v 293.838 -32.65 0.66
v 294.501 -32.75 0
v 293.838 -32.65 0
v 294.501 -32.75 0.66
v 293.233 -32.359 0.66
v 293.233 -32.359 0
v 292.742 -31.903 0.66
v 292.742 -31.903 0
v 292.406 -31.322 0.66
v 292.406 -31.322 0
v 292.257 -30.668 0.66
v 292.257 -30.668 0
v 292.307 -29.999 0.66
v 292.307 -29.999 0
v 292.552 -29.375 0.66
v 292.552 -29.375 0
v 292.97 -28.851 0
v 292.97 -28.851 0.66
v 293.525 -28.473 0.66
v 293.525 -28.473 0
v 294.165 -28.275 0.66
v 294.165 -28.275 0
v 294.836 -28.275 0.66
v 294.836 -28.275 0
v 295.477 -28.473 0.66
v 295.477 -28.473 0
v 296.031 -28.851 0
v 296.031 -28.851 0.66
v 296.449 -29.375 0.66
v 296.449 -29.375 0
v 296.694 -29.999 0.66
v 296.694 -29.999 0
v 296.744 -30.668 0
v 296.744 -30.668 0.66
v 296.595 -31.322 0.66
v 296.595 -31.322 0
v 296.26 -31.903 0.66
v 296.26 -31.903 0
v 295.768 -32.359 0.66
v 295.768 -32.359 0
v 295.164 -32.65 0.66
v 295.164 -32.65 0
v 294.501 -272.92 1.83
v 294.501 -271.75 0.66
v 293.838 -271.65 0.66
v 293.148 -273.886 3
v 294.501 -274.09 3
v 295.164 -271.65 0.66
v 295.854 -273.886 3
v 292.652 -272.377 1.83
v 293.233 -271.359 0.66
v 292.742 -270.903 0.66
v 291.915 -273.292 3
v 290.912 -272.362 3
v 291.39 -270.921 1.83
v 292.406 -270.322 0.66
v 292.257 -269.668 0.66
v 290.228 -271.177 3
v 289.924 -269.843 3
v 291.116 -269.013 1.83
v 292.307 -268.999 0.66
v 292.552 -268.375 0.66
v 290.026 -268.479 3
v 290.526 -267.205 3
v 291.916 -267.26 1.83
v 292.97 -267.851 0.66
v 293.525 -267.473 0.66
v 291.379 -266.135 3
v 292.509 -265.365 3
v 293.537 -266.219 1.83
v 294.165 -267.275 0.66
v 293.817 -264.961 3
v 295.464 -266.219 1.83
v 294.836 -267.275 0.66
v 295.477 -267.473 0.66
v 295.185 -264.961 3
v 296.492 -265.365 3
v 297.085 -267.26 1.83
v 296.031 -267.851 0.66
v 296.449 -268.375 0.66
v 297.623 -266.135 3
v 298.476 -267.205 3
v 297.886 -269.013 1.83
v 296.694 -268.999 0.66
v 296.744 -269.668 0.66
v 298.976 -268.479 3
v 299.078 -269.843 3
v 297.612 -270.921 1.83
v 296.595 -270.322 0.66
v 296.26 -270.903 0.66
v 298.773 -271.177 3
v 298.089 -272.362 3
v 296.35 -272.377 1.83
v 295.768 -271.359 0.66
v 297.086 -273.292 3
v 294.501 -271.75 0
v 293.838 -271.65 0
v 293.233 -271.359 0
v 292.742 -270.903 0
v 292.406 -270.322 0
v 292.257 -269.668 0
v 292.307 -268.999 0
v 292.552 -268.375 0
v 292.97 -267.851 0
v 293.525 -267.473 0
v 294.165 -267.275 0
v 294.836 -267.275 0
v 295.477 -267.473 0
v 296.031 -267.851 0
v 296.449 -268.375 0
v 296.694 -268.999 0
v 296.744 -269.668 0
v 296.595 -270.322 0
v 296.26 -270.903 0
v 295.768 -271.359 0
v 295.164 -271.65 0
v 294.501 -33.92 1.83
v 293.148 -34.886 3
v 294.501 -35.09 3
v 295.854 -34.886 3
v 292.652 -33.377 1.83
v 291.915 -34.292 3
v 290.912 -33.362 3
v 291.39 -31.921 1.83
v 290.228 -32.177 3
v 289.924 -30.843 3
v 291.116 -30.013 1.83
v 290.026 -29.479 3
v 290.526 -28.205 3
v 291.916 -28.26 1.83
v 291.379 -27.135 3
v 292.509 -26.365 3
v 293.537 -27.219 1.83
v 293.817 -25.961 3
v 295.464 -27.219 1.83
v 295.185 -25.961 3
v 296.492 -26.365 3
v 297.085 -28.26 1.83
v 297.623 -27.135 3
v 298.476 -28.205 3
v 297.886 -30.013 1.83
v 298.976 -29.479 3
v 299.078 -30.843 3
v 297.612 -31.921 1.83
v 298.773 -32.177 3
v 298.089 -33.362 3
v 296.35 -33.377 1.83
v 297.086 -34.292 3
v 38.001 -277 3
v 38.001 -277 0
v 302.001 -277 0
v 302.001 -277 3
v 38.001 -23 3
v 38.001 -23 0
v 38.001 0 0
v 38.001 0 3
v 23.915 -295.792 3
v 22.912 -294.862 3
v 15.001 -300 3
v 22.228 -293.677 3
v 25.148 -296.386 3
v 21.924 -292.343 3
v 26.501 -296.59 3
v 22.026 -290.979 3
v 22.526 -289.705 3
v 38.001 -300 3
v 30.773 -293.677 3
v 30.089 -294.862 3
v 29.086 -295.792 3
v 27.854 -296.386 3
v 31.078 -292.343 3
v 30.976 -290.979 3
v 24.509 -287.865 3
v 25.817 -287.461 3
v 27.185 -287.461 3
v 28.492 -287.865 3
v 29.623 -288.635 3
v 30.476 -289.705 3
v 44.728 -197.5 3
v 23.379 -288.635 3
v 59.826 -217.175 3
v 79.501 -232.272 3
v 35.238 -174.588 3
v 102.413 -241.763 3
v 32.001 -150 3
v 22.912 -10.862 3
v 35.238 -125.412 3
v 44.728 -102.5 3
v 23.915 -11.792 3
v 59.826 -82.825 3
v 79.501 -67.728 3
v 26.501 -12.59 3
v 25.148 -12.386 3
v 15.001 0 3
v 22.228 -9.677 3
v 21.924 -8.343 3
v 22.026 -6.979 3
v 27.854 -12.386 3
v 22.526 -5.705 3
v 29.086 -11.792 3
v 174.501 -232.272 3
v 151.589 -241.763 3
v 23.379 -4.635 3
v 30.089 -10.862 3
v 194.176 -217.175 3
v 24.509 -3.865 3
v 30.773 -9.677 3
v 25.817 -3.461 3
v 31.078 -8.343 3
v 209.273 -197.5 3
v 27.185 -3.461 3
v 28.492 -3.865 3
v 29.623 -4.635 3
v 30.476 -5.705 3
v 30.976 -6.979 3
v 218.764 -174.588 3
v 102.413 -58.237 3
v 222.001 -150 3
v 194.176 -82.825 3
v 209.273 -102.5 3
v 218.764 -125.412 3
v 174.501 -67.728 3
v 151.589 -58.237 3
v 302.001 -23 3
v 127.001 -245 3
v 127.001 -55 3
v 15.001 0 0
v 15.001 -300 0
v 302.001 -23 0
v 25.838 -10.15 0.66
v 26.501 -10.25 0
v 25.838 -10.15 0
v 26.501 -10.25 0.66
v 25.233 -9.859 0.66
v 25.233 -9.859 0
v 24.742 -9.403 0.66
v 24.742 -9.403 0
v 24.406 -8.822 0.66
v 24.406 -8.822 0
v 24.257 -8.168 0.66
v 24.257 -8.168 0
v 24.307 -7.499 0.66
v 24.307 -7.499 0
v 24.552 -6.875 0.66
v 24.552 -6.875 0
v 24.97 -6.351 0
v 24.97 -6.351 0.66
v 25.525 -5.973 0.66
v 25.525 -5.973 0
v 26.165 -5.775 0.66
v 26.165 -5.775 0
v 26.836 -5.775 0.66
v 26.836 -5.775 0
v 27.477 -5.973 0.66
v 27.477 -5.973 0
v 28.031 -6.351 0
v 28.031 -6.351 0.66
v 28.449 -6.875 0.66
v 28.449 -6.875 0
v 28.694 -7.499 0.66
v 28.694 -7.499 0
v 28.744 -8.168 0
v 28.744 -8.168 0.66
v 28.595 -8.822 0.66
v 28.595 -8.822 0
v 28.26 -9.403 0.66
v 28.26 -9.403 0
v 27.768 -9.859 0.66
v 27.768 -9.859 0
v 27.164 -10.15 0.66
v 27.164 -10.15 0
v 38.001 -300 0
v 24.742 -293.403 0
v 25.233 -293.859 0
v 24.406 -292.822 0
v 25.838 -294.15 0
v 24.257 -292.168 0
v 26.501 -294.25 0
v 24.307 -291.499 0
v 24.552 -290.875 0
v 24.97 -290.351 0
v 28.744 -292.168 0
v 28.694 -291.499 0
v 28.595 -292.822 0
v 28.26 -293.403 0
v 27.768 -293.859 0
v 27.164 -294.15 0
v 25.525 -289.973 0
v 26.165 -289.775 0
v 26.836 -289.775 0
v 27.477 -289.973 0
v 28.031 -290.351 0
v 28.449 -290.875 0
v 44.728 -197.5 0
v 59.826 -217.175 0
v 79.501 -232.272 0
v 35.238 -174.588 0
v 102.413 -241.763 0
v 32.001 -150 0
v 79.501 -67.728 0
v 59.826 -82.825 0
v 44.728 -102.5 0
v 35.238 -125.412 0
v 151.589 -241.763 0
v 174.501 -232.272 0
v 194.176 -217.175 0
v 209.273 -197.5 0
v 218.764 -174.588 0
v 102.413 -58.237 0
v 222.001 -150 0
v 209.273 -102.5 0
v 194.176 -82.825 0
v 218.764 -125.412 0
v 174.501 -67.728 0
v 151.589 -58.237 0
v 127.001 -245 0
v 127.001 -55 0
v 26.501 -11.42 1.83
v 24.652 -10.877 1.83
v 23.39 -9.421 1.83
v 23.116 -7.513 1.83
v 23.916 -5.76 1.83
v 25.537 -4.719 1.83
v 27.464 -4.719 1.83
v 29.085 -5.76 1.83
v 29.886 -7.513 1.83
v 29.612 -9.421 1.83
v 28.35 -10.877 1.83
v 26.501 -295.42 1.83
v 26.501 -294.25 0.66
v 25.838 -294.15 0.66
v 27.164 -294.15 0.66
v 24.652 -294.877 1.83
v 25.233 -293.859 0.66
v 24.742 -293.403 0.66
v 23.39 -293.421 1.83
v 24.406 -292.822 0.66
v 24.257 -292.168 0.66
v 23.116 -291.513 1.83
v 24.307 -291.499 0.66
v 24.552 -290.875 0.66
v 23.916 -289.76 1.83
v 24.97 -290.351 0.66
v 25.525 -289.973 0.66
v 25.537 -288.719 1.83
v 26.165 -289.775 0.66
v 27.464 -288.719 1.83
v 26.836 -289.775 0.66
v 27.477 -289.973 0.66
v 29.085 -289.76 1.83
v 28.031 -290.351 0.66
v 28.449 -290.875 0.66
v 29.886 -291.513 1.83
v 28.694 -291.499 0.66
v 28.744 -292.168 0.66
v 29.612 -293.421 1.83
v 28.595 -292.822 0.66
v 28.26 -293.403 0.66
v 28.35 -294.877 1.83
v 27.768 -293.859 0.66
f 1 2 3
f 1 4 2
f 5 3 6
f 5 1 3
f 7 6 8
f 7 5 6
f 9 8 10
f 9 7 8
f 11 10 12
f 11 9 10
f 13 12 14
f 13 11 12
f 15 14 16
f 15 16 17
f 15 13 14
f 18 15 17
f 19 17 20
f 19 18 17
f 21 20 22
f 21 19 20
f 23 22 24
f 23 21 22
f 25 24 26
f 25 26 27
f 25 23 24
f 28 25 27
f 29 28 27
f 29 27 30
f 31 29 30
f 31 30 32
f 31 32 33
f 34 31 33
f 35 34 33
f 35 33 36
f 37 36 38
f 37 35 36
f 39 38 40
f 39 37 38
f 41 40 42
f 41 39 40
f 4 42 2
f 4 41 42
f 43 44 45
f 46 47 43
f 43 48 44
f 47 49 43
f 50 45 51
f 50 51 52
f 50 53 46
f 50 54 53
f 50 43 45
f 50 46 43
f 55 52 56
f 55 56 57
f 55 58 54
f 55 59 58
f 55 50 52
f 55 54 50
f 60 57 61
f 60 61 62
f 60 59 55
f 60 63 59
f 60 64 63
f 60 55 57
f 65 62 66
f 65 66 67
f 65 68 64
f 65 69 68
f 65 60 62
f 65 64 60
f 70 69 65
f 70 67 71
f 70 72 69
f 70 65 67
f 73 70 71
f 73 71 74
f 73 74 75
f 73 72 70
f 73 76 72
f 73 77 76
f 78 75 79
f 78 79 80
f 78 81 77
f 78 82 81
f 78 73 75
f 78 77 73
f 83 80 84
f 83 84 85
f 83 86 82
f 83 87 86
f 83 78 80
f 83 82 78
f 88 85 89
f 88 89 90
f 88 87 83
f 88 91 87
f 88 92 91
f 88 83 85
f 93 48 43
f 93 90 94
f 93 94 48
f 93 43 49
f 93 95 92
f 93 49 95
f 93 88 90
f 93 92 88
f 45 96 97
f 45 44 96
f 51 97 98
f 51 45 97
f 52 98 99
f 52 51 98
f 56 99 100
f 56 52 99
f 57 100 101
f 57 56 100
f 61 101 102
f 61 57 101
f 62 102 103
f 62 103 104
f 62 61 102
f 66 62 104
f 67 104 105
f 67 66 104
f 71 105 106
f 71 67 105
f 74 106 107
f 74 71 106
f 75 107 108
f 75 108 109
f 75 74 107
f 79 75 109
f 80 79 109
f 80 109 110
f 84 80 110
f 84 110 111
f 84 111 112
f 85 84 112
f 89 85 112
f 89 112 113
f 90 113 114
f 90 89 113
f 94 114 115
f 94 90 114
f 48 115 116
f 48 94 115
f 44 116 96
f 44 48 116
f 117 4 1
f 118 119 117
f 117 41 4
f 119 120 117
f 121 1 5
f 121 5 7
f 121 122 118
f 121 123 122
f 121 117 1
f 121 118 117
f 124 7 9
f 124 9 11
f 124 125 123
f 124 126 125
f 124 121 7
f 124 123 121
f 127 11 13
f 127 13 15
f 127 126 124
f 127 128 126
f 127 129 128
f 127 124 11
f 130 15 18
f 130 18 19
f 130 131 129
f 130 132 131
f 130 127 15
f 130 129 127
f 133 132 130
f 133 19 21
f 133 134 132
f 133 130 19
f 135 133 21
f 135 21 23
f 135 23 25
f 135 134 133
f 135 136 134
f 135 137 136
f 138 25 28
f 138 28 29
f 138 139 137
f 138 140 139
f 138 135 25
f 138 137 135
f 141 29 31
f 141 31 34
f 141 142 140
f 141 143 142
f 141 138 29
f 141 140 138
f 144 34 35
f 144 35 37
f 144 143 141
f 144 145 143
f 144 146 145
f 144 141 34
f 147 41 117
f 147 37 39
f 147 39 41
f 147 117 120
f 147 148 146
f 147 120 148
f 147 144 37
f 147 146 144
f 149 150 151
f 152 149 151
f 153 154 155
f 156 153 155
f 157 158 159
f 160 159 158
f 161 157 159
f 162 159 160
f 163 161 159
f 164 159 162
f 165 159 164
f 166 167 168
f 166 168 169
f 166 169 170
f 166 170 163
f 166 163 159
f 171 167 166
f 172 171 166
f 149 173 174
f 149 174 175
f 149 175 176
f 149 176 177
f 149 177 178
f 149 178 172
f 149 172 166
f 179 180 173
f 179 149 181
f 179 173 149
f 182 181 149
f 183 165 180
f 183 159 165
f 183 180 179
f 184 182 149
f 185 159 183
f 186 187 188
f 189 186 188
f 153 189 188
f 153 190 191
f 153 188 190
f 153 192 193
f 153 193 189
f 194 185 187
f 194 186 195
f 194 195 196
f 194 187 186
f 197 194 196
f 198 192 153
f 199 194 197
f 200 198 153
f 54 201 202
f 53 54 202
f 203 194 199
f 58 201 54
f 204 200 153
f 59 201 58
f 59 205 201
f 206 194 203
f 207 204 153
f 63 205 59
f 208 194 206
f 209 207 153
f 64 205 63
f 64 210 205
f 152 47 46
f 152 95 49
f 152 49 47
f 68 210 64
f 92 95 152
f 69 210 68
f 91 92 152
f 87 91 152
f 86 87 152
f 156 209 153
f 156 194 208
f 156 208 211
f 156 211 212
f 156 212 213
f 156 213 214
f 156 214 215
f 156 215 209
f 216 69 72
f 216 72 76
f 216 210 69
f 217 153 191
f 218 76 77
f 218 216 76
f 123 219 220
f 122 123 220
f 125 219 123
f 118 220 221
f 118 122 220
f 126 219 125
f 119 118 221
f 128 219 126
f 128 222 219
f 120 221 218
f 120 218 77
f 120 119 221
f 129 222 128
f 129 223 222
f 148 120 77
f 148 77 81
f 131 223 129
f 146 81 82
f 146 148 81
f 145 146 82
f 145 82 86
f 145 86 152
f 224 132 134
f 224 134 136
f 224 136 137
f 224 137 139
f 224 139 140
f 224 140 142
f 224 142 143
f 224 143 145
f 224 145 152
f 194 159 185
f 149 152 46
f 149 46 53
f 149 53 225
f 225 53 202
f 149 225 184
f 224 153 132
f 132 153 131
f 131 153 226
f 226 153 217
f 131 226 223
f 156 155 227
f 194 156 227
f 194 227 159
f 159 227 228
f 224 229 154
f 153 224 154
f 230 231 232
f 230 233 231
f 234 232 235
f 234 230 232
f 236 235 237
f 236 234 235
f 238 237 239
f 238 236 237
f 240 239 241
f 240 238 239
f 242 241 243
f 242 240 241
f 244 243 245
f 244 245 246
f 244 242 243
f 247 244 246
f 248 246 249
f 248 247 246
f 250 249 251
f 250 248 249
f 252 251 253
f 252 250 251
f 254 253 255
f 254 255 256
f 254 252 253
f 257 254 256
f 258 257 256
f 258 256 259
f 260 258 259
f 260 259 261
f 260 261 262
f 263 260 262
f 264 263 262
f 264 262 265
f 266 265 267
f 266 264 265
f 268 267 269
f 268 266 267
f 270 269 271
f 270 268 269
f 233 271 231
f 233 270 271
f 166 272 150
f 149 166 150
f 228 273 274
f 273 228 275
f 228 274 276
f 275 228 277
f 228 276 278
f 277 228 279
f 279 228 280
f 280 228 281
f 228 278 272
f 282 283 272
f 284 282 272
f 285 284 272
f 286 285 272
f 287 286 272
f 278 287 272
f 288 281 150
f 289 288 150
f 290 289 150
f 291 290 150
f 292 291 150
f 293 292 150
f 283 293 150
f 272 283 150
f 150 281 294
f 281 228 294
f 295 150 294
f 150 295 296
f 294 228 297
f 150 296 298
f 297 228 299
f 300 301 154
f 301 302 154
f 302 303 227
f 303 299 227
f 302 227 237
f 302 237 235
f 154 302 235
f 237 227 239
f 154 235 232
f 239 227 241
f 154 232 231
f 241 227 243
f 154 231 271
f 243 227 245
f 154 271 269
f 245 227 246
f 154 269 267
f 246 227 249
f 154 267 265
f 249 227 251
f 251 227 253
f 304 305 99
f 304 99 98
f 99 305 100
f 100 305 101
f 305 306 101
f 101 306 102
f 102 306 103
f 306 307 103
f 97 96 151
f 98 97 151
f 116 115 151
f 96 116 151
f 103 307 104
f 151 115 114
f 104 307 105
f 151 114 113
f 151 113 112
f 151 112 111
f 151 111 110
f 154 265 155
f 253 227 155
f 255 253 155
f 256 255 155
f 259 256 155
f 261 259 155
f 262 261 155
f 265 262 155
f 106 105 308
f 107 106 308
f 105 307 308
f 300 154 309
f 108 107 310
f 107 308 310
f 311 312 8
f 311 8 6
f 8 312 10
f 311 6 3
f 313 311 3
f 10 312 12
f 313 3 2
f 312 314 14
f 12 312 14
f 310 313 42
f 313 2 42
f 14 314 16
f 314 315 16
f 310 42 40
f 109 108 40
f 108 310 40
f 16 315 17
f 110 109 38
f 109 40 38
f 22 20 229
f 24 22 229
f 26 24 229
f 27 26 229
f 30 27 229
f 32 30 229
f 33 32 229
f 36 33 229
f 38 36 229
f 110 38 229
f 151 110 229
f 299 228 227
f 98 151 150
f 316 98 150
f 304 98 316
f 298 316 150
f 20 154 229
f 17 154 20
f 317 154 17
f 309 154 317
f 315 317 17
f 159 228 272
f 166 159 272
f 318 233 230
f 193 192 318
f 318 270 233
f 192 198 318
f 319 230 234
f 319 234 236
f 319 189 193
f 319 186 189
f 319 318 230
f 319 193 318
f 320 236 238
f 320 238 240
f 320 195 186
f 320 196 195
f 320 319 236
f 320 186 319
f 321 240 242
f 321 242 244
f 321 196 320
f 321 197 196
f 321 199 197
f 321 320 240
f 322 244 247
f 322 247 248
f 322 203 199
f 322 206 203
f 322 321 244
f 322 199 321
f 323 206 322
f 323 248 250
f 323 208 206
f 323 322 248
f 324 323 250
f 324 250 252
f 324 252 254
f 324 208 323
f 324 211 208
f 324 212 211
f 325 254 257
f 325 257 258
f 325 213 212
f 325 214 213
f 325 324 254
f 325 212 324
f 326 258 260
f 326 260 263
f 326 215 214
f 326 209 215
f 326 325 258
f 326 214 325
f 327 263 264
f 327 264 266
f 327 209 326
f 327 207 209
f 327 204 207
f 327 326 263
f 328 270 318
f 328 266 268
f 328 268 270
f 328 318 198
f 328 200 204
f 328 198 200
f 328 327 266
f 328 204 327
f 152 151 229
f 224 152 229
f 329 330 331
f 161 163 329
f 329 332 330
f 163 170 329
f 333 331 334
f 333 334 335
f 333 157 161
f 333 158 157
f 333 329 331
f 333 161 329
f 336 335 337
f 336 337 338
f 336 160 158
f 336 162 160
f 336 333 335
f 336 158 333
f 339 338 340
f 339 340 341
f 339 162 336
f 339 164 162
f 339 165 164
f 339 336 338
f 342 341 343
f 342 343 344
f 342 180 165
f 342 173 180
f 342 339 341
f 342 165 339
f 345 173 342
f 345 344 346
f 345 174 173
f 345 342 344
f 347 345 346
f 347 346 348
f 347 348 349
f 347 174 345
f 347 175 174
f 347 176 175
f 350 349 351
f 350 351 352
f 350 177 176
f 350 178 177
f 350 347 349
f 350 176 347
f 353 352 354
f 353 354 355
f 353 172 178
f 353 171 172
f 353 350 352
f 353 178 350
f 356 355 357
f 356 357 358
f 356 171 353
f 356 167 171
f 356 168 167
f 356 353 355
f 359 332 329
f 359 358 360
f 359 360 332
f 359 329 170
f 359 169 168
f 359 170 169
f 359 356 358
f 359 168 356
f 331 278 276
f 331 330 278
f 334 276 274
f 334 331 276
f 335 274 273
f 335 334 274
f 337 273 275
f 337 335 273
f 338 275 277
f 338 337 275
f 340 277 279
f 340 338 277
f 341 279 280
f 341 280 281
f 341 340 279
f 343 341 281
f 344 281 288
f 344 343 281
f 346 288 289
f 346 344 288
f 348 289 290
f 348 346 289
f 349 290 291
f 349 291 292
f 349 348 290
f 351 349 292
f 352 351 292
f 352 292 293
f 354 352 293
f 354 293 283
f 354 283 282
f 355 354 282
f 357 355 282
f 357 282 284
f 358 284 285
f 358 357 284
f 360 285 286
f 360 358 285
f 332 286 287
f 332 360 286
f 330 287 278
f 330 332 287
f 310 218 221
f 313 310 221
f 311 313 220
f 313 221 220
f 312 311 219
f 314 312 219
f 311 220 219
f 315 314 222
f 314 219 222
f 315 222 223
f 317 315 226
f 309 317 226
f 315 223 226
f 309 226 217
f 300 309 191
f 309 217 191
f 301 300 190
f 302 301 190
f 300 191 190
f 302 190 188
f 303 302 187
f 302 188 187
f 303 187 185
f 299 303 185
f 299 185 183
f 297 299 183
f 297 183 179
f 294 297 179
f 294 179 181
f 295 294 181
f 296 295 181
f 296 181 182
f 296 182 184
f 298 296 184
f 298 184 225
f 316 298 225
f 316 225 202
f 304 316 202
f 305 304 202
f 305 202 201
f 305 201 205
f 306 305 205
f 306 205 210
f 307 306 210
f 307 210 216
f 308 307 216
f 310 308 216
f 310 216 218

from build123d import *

# Parameters (mm, degrees)
AUFSATZ_LINEAR_AUSTRAGEN1_DEPTH             = 3
FORMSENKUNG_F_R_M4_SENKSCHRAUBE_MIT_2_COUNT = 2
FORMSENKUNG_F_R_M4_SENKSCHRAUBE_MIT_2_PITCH = 284
FORMSENKUNG_F_R_M4_SENKSCHRAUBE_MIT_3_COUNT = 2
FORMSENKUNG_F_R_M4_SENKSCHRAUBE_MIT_3_PITCH = 268.942837793
FORMSENKUNG_F_R_M4_SENKSCHRAUBE_MIT_4_COUNT = 2
FORMSENKUNG_F_R_M4_SENKSCHRAUBE_MIT_4_PITCH = 374.441250399
SKIZZE4_R                                   = 95
SCHNITT_LINEAR_AUSTRAGEN1_DEPTH             = 10


with BuildPart() as part:
    # Skizze1 → Aufsatz-Linear austragen1 (new body)
    with BuildSketch(Plane.XY):
        Polygon((15.000749991, 0), (15.000749991, -300), (38.000749991, -300), (38.000749991, -277), (302.000749991, -277), (302.000749991, -23), (38.000749991, -23), (38.000749991, 0), align=None)
    extrude(amount=AUFSATZ_LINEAR_AUSTRAGEN1_DEPTH)

    # Skizze3 → Formsenkung für M4 Senkschraube mit Innensechskant1 (revolve, cut)
    with BuildSketch(Plane(origin=(26.500749991, -8, 3), x_dir=(0, -1, 0), z_dir=(1, 0, 0))):
        Polygon((0, 0), (0, 3), (2.25, 3), (2.25, 2.34), (4.59, 0), align=None)
    formsenkung_f_r_m4_senkschraube_mit_inne = revolve(axis=Axis((26.500749991, -8, 9.35), (0, 0, -1)), mode=Mode.SUBTRACT)

    # Formsenkung f_r M4 Senkschraube mit  2: Formsenkung für M4 Senkschraube mit Innensechskant1 ×2
    with Locations(*[(0, -i * FORMSENKUNG_F_R_M4_SENKSCHRAUBE_MIT_2_PITCH, 0) for i in range(1, FORMSENKUNG_F_R_M4_SENKSCHRAUBE_MIT_2_COUNT)]):
        add(formsenkung_f_r_m4_senkschraube_mit_inne, mode=Mode.SUBTRACT)

    # Formsenkung f_r M4 Senkschraube mit  3: Formsenkung für M4 Senkschraube mit Innensechskant1 ×2
    with Locations(*[Vector(0.9964942818315755, -0.08366090052690477, 0) * (i * FORMSENKUNG_F_R_M4_SENKSCHRAUBE_MIT_3_PITCH) for i in range(1, FORMSENKUNG_F_R_M4_SENKSCHRAUBE_MIT_3_COUNT)]):
        add(formsenkung_f_r_m4_senkschraube_mit_inne, mode=Mode.SUBTRACT)

    # Formsenkung f_r M4 Senkschraube mit  4: Formsenkung für M4 Senkschraube mit Innensechskant1 ×2
    with Locations(*[Vector(0.7157331082373348, -0.6983739097166529, 0) * (i * FORMSENKUNG_F_R_M4_SENKSCHRAUBE_MIT_4_PITCH) for i in range(1, FORMSENKUNG_F_R_M4_SENKSCHRAUBE_MIT_4_COUNT)]):
        add(formsenkung_f_r_m4_senkschraube_mit_inne, mode=Mode.SUBTRACT)

    # Skizze4 → Schnitt-Linear austragen1 (cut)
    with BuildSketch(Plane.XY.offset(3)):
        with Locations((127.000749991, -150)):
            Circle(SKIZZE4_R)
    extrude(amount=-SCHNITT_LINEAR_AUSTRAGEN1_DEPTH, mode=Mode.SUBTRACT)


solid = part.part
